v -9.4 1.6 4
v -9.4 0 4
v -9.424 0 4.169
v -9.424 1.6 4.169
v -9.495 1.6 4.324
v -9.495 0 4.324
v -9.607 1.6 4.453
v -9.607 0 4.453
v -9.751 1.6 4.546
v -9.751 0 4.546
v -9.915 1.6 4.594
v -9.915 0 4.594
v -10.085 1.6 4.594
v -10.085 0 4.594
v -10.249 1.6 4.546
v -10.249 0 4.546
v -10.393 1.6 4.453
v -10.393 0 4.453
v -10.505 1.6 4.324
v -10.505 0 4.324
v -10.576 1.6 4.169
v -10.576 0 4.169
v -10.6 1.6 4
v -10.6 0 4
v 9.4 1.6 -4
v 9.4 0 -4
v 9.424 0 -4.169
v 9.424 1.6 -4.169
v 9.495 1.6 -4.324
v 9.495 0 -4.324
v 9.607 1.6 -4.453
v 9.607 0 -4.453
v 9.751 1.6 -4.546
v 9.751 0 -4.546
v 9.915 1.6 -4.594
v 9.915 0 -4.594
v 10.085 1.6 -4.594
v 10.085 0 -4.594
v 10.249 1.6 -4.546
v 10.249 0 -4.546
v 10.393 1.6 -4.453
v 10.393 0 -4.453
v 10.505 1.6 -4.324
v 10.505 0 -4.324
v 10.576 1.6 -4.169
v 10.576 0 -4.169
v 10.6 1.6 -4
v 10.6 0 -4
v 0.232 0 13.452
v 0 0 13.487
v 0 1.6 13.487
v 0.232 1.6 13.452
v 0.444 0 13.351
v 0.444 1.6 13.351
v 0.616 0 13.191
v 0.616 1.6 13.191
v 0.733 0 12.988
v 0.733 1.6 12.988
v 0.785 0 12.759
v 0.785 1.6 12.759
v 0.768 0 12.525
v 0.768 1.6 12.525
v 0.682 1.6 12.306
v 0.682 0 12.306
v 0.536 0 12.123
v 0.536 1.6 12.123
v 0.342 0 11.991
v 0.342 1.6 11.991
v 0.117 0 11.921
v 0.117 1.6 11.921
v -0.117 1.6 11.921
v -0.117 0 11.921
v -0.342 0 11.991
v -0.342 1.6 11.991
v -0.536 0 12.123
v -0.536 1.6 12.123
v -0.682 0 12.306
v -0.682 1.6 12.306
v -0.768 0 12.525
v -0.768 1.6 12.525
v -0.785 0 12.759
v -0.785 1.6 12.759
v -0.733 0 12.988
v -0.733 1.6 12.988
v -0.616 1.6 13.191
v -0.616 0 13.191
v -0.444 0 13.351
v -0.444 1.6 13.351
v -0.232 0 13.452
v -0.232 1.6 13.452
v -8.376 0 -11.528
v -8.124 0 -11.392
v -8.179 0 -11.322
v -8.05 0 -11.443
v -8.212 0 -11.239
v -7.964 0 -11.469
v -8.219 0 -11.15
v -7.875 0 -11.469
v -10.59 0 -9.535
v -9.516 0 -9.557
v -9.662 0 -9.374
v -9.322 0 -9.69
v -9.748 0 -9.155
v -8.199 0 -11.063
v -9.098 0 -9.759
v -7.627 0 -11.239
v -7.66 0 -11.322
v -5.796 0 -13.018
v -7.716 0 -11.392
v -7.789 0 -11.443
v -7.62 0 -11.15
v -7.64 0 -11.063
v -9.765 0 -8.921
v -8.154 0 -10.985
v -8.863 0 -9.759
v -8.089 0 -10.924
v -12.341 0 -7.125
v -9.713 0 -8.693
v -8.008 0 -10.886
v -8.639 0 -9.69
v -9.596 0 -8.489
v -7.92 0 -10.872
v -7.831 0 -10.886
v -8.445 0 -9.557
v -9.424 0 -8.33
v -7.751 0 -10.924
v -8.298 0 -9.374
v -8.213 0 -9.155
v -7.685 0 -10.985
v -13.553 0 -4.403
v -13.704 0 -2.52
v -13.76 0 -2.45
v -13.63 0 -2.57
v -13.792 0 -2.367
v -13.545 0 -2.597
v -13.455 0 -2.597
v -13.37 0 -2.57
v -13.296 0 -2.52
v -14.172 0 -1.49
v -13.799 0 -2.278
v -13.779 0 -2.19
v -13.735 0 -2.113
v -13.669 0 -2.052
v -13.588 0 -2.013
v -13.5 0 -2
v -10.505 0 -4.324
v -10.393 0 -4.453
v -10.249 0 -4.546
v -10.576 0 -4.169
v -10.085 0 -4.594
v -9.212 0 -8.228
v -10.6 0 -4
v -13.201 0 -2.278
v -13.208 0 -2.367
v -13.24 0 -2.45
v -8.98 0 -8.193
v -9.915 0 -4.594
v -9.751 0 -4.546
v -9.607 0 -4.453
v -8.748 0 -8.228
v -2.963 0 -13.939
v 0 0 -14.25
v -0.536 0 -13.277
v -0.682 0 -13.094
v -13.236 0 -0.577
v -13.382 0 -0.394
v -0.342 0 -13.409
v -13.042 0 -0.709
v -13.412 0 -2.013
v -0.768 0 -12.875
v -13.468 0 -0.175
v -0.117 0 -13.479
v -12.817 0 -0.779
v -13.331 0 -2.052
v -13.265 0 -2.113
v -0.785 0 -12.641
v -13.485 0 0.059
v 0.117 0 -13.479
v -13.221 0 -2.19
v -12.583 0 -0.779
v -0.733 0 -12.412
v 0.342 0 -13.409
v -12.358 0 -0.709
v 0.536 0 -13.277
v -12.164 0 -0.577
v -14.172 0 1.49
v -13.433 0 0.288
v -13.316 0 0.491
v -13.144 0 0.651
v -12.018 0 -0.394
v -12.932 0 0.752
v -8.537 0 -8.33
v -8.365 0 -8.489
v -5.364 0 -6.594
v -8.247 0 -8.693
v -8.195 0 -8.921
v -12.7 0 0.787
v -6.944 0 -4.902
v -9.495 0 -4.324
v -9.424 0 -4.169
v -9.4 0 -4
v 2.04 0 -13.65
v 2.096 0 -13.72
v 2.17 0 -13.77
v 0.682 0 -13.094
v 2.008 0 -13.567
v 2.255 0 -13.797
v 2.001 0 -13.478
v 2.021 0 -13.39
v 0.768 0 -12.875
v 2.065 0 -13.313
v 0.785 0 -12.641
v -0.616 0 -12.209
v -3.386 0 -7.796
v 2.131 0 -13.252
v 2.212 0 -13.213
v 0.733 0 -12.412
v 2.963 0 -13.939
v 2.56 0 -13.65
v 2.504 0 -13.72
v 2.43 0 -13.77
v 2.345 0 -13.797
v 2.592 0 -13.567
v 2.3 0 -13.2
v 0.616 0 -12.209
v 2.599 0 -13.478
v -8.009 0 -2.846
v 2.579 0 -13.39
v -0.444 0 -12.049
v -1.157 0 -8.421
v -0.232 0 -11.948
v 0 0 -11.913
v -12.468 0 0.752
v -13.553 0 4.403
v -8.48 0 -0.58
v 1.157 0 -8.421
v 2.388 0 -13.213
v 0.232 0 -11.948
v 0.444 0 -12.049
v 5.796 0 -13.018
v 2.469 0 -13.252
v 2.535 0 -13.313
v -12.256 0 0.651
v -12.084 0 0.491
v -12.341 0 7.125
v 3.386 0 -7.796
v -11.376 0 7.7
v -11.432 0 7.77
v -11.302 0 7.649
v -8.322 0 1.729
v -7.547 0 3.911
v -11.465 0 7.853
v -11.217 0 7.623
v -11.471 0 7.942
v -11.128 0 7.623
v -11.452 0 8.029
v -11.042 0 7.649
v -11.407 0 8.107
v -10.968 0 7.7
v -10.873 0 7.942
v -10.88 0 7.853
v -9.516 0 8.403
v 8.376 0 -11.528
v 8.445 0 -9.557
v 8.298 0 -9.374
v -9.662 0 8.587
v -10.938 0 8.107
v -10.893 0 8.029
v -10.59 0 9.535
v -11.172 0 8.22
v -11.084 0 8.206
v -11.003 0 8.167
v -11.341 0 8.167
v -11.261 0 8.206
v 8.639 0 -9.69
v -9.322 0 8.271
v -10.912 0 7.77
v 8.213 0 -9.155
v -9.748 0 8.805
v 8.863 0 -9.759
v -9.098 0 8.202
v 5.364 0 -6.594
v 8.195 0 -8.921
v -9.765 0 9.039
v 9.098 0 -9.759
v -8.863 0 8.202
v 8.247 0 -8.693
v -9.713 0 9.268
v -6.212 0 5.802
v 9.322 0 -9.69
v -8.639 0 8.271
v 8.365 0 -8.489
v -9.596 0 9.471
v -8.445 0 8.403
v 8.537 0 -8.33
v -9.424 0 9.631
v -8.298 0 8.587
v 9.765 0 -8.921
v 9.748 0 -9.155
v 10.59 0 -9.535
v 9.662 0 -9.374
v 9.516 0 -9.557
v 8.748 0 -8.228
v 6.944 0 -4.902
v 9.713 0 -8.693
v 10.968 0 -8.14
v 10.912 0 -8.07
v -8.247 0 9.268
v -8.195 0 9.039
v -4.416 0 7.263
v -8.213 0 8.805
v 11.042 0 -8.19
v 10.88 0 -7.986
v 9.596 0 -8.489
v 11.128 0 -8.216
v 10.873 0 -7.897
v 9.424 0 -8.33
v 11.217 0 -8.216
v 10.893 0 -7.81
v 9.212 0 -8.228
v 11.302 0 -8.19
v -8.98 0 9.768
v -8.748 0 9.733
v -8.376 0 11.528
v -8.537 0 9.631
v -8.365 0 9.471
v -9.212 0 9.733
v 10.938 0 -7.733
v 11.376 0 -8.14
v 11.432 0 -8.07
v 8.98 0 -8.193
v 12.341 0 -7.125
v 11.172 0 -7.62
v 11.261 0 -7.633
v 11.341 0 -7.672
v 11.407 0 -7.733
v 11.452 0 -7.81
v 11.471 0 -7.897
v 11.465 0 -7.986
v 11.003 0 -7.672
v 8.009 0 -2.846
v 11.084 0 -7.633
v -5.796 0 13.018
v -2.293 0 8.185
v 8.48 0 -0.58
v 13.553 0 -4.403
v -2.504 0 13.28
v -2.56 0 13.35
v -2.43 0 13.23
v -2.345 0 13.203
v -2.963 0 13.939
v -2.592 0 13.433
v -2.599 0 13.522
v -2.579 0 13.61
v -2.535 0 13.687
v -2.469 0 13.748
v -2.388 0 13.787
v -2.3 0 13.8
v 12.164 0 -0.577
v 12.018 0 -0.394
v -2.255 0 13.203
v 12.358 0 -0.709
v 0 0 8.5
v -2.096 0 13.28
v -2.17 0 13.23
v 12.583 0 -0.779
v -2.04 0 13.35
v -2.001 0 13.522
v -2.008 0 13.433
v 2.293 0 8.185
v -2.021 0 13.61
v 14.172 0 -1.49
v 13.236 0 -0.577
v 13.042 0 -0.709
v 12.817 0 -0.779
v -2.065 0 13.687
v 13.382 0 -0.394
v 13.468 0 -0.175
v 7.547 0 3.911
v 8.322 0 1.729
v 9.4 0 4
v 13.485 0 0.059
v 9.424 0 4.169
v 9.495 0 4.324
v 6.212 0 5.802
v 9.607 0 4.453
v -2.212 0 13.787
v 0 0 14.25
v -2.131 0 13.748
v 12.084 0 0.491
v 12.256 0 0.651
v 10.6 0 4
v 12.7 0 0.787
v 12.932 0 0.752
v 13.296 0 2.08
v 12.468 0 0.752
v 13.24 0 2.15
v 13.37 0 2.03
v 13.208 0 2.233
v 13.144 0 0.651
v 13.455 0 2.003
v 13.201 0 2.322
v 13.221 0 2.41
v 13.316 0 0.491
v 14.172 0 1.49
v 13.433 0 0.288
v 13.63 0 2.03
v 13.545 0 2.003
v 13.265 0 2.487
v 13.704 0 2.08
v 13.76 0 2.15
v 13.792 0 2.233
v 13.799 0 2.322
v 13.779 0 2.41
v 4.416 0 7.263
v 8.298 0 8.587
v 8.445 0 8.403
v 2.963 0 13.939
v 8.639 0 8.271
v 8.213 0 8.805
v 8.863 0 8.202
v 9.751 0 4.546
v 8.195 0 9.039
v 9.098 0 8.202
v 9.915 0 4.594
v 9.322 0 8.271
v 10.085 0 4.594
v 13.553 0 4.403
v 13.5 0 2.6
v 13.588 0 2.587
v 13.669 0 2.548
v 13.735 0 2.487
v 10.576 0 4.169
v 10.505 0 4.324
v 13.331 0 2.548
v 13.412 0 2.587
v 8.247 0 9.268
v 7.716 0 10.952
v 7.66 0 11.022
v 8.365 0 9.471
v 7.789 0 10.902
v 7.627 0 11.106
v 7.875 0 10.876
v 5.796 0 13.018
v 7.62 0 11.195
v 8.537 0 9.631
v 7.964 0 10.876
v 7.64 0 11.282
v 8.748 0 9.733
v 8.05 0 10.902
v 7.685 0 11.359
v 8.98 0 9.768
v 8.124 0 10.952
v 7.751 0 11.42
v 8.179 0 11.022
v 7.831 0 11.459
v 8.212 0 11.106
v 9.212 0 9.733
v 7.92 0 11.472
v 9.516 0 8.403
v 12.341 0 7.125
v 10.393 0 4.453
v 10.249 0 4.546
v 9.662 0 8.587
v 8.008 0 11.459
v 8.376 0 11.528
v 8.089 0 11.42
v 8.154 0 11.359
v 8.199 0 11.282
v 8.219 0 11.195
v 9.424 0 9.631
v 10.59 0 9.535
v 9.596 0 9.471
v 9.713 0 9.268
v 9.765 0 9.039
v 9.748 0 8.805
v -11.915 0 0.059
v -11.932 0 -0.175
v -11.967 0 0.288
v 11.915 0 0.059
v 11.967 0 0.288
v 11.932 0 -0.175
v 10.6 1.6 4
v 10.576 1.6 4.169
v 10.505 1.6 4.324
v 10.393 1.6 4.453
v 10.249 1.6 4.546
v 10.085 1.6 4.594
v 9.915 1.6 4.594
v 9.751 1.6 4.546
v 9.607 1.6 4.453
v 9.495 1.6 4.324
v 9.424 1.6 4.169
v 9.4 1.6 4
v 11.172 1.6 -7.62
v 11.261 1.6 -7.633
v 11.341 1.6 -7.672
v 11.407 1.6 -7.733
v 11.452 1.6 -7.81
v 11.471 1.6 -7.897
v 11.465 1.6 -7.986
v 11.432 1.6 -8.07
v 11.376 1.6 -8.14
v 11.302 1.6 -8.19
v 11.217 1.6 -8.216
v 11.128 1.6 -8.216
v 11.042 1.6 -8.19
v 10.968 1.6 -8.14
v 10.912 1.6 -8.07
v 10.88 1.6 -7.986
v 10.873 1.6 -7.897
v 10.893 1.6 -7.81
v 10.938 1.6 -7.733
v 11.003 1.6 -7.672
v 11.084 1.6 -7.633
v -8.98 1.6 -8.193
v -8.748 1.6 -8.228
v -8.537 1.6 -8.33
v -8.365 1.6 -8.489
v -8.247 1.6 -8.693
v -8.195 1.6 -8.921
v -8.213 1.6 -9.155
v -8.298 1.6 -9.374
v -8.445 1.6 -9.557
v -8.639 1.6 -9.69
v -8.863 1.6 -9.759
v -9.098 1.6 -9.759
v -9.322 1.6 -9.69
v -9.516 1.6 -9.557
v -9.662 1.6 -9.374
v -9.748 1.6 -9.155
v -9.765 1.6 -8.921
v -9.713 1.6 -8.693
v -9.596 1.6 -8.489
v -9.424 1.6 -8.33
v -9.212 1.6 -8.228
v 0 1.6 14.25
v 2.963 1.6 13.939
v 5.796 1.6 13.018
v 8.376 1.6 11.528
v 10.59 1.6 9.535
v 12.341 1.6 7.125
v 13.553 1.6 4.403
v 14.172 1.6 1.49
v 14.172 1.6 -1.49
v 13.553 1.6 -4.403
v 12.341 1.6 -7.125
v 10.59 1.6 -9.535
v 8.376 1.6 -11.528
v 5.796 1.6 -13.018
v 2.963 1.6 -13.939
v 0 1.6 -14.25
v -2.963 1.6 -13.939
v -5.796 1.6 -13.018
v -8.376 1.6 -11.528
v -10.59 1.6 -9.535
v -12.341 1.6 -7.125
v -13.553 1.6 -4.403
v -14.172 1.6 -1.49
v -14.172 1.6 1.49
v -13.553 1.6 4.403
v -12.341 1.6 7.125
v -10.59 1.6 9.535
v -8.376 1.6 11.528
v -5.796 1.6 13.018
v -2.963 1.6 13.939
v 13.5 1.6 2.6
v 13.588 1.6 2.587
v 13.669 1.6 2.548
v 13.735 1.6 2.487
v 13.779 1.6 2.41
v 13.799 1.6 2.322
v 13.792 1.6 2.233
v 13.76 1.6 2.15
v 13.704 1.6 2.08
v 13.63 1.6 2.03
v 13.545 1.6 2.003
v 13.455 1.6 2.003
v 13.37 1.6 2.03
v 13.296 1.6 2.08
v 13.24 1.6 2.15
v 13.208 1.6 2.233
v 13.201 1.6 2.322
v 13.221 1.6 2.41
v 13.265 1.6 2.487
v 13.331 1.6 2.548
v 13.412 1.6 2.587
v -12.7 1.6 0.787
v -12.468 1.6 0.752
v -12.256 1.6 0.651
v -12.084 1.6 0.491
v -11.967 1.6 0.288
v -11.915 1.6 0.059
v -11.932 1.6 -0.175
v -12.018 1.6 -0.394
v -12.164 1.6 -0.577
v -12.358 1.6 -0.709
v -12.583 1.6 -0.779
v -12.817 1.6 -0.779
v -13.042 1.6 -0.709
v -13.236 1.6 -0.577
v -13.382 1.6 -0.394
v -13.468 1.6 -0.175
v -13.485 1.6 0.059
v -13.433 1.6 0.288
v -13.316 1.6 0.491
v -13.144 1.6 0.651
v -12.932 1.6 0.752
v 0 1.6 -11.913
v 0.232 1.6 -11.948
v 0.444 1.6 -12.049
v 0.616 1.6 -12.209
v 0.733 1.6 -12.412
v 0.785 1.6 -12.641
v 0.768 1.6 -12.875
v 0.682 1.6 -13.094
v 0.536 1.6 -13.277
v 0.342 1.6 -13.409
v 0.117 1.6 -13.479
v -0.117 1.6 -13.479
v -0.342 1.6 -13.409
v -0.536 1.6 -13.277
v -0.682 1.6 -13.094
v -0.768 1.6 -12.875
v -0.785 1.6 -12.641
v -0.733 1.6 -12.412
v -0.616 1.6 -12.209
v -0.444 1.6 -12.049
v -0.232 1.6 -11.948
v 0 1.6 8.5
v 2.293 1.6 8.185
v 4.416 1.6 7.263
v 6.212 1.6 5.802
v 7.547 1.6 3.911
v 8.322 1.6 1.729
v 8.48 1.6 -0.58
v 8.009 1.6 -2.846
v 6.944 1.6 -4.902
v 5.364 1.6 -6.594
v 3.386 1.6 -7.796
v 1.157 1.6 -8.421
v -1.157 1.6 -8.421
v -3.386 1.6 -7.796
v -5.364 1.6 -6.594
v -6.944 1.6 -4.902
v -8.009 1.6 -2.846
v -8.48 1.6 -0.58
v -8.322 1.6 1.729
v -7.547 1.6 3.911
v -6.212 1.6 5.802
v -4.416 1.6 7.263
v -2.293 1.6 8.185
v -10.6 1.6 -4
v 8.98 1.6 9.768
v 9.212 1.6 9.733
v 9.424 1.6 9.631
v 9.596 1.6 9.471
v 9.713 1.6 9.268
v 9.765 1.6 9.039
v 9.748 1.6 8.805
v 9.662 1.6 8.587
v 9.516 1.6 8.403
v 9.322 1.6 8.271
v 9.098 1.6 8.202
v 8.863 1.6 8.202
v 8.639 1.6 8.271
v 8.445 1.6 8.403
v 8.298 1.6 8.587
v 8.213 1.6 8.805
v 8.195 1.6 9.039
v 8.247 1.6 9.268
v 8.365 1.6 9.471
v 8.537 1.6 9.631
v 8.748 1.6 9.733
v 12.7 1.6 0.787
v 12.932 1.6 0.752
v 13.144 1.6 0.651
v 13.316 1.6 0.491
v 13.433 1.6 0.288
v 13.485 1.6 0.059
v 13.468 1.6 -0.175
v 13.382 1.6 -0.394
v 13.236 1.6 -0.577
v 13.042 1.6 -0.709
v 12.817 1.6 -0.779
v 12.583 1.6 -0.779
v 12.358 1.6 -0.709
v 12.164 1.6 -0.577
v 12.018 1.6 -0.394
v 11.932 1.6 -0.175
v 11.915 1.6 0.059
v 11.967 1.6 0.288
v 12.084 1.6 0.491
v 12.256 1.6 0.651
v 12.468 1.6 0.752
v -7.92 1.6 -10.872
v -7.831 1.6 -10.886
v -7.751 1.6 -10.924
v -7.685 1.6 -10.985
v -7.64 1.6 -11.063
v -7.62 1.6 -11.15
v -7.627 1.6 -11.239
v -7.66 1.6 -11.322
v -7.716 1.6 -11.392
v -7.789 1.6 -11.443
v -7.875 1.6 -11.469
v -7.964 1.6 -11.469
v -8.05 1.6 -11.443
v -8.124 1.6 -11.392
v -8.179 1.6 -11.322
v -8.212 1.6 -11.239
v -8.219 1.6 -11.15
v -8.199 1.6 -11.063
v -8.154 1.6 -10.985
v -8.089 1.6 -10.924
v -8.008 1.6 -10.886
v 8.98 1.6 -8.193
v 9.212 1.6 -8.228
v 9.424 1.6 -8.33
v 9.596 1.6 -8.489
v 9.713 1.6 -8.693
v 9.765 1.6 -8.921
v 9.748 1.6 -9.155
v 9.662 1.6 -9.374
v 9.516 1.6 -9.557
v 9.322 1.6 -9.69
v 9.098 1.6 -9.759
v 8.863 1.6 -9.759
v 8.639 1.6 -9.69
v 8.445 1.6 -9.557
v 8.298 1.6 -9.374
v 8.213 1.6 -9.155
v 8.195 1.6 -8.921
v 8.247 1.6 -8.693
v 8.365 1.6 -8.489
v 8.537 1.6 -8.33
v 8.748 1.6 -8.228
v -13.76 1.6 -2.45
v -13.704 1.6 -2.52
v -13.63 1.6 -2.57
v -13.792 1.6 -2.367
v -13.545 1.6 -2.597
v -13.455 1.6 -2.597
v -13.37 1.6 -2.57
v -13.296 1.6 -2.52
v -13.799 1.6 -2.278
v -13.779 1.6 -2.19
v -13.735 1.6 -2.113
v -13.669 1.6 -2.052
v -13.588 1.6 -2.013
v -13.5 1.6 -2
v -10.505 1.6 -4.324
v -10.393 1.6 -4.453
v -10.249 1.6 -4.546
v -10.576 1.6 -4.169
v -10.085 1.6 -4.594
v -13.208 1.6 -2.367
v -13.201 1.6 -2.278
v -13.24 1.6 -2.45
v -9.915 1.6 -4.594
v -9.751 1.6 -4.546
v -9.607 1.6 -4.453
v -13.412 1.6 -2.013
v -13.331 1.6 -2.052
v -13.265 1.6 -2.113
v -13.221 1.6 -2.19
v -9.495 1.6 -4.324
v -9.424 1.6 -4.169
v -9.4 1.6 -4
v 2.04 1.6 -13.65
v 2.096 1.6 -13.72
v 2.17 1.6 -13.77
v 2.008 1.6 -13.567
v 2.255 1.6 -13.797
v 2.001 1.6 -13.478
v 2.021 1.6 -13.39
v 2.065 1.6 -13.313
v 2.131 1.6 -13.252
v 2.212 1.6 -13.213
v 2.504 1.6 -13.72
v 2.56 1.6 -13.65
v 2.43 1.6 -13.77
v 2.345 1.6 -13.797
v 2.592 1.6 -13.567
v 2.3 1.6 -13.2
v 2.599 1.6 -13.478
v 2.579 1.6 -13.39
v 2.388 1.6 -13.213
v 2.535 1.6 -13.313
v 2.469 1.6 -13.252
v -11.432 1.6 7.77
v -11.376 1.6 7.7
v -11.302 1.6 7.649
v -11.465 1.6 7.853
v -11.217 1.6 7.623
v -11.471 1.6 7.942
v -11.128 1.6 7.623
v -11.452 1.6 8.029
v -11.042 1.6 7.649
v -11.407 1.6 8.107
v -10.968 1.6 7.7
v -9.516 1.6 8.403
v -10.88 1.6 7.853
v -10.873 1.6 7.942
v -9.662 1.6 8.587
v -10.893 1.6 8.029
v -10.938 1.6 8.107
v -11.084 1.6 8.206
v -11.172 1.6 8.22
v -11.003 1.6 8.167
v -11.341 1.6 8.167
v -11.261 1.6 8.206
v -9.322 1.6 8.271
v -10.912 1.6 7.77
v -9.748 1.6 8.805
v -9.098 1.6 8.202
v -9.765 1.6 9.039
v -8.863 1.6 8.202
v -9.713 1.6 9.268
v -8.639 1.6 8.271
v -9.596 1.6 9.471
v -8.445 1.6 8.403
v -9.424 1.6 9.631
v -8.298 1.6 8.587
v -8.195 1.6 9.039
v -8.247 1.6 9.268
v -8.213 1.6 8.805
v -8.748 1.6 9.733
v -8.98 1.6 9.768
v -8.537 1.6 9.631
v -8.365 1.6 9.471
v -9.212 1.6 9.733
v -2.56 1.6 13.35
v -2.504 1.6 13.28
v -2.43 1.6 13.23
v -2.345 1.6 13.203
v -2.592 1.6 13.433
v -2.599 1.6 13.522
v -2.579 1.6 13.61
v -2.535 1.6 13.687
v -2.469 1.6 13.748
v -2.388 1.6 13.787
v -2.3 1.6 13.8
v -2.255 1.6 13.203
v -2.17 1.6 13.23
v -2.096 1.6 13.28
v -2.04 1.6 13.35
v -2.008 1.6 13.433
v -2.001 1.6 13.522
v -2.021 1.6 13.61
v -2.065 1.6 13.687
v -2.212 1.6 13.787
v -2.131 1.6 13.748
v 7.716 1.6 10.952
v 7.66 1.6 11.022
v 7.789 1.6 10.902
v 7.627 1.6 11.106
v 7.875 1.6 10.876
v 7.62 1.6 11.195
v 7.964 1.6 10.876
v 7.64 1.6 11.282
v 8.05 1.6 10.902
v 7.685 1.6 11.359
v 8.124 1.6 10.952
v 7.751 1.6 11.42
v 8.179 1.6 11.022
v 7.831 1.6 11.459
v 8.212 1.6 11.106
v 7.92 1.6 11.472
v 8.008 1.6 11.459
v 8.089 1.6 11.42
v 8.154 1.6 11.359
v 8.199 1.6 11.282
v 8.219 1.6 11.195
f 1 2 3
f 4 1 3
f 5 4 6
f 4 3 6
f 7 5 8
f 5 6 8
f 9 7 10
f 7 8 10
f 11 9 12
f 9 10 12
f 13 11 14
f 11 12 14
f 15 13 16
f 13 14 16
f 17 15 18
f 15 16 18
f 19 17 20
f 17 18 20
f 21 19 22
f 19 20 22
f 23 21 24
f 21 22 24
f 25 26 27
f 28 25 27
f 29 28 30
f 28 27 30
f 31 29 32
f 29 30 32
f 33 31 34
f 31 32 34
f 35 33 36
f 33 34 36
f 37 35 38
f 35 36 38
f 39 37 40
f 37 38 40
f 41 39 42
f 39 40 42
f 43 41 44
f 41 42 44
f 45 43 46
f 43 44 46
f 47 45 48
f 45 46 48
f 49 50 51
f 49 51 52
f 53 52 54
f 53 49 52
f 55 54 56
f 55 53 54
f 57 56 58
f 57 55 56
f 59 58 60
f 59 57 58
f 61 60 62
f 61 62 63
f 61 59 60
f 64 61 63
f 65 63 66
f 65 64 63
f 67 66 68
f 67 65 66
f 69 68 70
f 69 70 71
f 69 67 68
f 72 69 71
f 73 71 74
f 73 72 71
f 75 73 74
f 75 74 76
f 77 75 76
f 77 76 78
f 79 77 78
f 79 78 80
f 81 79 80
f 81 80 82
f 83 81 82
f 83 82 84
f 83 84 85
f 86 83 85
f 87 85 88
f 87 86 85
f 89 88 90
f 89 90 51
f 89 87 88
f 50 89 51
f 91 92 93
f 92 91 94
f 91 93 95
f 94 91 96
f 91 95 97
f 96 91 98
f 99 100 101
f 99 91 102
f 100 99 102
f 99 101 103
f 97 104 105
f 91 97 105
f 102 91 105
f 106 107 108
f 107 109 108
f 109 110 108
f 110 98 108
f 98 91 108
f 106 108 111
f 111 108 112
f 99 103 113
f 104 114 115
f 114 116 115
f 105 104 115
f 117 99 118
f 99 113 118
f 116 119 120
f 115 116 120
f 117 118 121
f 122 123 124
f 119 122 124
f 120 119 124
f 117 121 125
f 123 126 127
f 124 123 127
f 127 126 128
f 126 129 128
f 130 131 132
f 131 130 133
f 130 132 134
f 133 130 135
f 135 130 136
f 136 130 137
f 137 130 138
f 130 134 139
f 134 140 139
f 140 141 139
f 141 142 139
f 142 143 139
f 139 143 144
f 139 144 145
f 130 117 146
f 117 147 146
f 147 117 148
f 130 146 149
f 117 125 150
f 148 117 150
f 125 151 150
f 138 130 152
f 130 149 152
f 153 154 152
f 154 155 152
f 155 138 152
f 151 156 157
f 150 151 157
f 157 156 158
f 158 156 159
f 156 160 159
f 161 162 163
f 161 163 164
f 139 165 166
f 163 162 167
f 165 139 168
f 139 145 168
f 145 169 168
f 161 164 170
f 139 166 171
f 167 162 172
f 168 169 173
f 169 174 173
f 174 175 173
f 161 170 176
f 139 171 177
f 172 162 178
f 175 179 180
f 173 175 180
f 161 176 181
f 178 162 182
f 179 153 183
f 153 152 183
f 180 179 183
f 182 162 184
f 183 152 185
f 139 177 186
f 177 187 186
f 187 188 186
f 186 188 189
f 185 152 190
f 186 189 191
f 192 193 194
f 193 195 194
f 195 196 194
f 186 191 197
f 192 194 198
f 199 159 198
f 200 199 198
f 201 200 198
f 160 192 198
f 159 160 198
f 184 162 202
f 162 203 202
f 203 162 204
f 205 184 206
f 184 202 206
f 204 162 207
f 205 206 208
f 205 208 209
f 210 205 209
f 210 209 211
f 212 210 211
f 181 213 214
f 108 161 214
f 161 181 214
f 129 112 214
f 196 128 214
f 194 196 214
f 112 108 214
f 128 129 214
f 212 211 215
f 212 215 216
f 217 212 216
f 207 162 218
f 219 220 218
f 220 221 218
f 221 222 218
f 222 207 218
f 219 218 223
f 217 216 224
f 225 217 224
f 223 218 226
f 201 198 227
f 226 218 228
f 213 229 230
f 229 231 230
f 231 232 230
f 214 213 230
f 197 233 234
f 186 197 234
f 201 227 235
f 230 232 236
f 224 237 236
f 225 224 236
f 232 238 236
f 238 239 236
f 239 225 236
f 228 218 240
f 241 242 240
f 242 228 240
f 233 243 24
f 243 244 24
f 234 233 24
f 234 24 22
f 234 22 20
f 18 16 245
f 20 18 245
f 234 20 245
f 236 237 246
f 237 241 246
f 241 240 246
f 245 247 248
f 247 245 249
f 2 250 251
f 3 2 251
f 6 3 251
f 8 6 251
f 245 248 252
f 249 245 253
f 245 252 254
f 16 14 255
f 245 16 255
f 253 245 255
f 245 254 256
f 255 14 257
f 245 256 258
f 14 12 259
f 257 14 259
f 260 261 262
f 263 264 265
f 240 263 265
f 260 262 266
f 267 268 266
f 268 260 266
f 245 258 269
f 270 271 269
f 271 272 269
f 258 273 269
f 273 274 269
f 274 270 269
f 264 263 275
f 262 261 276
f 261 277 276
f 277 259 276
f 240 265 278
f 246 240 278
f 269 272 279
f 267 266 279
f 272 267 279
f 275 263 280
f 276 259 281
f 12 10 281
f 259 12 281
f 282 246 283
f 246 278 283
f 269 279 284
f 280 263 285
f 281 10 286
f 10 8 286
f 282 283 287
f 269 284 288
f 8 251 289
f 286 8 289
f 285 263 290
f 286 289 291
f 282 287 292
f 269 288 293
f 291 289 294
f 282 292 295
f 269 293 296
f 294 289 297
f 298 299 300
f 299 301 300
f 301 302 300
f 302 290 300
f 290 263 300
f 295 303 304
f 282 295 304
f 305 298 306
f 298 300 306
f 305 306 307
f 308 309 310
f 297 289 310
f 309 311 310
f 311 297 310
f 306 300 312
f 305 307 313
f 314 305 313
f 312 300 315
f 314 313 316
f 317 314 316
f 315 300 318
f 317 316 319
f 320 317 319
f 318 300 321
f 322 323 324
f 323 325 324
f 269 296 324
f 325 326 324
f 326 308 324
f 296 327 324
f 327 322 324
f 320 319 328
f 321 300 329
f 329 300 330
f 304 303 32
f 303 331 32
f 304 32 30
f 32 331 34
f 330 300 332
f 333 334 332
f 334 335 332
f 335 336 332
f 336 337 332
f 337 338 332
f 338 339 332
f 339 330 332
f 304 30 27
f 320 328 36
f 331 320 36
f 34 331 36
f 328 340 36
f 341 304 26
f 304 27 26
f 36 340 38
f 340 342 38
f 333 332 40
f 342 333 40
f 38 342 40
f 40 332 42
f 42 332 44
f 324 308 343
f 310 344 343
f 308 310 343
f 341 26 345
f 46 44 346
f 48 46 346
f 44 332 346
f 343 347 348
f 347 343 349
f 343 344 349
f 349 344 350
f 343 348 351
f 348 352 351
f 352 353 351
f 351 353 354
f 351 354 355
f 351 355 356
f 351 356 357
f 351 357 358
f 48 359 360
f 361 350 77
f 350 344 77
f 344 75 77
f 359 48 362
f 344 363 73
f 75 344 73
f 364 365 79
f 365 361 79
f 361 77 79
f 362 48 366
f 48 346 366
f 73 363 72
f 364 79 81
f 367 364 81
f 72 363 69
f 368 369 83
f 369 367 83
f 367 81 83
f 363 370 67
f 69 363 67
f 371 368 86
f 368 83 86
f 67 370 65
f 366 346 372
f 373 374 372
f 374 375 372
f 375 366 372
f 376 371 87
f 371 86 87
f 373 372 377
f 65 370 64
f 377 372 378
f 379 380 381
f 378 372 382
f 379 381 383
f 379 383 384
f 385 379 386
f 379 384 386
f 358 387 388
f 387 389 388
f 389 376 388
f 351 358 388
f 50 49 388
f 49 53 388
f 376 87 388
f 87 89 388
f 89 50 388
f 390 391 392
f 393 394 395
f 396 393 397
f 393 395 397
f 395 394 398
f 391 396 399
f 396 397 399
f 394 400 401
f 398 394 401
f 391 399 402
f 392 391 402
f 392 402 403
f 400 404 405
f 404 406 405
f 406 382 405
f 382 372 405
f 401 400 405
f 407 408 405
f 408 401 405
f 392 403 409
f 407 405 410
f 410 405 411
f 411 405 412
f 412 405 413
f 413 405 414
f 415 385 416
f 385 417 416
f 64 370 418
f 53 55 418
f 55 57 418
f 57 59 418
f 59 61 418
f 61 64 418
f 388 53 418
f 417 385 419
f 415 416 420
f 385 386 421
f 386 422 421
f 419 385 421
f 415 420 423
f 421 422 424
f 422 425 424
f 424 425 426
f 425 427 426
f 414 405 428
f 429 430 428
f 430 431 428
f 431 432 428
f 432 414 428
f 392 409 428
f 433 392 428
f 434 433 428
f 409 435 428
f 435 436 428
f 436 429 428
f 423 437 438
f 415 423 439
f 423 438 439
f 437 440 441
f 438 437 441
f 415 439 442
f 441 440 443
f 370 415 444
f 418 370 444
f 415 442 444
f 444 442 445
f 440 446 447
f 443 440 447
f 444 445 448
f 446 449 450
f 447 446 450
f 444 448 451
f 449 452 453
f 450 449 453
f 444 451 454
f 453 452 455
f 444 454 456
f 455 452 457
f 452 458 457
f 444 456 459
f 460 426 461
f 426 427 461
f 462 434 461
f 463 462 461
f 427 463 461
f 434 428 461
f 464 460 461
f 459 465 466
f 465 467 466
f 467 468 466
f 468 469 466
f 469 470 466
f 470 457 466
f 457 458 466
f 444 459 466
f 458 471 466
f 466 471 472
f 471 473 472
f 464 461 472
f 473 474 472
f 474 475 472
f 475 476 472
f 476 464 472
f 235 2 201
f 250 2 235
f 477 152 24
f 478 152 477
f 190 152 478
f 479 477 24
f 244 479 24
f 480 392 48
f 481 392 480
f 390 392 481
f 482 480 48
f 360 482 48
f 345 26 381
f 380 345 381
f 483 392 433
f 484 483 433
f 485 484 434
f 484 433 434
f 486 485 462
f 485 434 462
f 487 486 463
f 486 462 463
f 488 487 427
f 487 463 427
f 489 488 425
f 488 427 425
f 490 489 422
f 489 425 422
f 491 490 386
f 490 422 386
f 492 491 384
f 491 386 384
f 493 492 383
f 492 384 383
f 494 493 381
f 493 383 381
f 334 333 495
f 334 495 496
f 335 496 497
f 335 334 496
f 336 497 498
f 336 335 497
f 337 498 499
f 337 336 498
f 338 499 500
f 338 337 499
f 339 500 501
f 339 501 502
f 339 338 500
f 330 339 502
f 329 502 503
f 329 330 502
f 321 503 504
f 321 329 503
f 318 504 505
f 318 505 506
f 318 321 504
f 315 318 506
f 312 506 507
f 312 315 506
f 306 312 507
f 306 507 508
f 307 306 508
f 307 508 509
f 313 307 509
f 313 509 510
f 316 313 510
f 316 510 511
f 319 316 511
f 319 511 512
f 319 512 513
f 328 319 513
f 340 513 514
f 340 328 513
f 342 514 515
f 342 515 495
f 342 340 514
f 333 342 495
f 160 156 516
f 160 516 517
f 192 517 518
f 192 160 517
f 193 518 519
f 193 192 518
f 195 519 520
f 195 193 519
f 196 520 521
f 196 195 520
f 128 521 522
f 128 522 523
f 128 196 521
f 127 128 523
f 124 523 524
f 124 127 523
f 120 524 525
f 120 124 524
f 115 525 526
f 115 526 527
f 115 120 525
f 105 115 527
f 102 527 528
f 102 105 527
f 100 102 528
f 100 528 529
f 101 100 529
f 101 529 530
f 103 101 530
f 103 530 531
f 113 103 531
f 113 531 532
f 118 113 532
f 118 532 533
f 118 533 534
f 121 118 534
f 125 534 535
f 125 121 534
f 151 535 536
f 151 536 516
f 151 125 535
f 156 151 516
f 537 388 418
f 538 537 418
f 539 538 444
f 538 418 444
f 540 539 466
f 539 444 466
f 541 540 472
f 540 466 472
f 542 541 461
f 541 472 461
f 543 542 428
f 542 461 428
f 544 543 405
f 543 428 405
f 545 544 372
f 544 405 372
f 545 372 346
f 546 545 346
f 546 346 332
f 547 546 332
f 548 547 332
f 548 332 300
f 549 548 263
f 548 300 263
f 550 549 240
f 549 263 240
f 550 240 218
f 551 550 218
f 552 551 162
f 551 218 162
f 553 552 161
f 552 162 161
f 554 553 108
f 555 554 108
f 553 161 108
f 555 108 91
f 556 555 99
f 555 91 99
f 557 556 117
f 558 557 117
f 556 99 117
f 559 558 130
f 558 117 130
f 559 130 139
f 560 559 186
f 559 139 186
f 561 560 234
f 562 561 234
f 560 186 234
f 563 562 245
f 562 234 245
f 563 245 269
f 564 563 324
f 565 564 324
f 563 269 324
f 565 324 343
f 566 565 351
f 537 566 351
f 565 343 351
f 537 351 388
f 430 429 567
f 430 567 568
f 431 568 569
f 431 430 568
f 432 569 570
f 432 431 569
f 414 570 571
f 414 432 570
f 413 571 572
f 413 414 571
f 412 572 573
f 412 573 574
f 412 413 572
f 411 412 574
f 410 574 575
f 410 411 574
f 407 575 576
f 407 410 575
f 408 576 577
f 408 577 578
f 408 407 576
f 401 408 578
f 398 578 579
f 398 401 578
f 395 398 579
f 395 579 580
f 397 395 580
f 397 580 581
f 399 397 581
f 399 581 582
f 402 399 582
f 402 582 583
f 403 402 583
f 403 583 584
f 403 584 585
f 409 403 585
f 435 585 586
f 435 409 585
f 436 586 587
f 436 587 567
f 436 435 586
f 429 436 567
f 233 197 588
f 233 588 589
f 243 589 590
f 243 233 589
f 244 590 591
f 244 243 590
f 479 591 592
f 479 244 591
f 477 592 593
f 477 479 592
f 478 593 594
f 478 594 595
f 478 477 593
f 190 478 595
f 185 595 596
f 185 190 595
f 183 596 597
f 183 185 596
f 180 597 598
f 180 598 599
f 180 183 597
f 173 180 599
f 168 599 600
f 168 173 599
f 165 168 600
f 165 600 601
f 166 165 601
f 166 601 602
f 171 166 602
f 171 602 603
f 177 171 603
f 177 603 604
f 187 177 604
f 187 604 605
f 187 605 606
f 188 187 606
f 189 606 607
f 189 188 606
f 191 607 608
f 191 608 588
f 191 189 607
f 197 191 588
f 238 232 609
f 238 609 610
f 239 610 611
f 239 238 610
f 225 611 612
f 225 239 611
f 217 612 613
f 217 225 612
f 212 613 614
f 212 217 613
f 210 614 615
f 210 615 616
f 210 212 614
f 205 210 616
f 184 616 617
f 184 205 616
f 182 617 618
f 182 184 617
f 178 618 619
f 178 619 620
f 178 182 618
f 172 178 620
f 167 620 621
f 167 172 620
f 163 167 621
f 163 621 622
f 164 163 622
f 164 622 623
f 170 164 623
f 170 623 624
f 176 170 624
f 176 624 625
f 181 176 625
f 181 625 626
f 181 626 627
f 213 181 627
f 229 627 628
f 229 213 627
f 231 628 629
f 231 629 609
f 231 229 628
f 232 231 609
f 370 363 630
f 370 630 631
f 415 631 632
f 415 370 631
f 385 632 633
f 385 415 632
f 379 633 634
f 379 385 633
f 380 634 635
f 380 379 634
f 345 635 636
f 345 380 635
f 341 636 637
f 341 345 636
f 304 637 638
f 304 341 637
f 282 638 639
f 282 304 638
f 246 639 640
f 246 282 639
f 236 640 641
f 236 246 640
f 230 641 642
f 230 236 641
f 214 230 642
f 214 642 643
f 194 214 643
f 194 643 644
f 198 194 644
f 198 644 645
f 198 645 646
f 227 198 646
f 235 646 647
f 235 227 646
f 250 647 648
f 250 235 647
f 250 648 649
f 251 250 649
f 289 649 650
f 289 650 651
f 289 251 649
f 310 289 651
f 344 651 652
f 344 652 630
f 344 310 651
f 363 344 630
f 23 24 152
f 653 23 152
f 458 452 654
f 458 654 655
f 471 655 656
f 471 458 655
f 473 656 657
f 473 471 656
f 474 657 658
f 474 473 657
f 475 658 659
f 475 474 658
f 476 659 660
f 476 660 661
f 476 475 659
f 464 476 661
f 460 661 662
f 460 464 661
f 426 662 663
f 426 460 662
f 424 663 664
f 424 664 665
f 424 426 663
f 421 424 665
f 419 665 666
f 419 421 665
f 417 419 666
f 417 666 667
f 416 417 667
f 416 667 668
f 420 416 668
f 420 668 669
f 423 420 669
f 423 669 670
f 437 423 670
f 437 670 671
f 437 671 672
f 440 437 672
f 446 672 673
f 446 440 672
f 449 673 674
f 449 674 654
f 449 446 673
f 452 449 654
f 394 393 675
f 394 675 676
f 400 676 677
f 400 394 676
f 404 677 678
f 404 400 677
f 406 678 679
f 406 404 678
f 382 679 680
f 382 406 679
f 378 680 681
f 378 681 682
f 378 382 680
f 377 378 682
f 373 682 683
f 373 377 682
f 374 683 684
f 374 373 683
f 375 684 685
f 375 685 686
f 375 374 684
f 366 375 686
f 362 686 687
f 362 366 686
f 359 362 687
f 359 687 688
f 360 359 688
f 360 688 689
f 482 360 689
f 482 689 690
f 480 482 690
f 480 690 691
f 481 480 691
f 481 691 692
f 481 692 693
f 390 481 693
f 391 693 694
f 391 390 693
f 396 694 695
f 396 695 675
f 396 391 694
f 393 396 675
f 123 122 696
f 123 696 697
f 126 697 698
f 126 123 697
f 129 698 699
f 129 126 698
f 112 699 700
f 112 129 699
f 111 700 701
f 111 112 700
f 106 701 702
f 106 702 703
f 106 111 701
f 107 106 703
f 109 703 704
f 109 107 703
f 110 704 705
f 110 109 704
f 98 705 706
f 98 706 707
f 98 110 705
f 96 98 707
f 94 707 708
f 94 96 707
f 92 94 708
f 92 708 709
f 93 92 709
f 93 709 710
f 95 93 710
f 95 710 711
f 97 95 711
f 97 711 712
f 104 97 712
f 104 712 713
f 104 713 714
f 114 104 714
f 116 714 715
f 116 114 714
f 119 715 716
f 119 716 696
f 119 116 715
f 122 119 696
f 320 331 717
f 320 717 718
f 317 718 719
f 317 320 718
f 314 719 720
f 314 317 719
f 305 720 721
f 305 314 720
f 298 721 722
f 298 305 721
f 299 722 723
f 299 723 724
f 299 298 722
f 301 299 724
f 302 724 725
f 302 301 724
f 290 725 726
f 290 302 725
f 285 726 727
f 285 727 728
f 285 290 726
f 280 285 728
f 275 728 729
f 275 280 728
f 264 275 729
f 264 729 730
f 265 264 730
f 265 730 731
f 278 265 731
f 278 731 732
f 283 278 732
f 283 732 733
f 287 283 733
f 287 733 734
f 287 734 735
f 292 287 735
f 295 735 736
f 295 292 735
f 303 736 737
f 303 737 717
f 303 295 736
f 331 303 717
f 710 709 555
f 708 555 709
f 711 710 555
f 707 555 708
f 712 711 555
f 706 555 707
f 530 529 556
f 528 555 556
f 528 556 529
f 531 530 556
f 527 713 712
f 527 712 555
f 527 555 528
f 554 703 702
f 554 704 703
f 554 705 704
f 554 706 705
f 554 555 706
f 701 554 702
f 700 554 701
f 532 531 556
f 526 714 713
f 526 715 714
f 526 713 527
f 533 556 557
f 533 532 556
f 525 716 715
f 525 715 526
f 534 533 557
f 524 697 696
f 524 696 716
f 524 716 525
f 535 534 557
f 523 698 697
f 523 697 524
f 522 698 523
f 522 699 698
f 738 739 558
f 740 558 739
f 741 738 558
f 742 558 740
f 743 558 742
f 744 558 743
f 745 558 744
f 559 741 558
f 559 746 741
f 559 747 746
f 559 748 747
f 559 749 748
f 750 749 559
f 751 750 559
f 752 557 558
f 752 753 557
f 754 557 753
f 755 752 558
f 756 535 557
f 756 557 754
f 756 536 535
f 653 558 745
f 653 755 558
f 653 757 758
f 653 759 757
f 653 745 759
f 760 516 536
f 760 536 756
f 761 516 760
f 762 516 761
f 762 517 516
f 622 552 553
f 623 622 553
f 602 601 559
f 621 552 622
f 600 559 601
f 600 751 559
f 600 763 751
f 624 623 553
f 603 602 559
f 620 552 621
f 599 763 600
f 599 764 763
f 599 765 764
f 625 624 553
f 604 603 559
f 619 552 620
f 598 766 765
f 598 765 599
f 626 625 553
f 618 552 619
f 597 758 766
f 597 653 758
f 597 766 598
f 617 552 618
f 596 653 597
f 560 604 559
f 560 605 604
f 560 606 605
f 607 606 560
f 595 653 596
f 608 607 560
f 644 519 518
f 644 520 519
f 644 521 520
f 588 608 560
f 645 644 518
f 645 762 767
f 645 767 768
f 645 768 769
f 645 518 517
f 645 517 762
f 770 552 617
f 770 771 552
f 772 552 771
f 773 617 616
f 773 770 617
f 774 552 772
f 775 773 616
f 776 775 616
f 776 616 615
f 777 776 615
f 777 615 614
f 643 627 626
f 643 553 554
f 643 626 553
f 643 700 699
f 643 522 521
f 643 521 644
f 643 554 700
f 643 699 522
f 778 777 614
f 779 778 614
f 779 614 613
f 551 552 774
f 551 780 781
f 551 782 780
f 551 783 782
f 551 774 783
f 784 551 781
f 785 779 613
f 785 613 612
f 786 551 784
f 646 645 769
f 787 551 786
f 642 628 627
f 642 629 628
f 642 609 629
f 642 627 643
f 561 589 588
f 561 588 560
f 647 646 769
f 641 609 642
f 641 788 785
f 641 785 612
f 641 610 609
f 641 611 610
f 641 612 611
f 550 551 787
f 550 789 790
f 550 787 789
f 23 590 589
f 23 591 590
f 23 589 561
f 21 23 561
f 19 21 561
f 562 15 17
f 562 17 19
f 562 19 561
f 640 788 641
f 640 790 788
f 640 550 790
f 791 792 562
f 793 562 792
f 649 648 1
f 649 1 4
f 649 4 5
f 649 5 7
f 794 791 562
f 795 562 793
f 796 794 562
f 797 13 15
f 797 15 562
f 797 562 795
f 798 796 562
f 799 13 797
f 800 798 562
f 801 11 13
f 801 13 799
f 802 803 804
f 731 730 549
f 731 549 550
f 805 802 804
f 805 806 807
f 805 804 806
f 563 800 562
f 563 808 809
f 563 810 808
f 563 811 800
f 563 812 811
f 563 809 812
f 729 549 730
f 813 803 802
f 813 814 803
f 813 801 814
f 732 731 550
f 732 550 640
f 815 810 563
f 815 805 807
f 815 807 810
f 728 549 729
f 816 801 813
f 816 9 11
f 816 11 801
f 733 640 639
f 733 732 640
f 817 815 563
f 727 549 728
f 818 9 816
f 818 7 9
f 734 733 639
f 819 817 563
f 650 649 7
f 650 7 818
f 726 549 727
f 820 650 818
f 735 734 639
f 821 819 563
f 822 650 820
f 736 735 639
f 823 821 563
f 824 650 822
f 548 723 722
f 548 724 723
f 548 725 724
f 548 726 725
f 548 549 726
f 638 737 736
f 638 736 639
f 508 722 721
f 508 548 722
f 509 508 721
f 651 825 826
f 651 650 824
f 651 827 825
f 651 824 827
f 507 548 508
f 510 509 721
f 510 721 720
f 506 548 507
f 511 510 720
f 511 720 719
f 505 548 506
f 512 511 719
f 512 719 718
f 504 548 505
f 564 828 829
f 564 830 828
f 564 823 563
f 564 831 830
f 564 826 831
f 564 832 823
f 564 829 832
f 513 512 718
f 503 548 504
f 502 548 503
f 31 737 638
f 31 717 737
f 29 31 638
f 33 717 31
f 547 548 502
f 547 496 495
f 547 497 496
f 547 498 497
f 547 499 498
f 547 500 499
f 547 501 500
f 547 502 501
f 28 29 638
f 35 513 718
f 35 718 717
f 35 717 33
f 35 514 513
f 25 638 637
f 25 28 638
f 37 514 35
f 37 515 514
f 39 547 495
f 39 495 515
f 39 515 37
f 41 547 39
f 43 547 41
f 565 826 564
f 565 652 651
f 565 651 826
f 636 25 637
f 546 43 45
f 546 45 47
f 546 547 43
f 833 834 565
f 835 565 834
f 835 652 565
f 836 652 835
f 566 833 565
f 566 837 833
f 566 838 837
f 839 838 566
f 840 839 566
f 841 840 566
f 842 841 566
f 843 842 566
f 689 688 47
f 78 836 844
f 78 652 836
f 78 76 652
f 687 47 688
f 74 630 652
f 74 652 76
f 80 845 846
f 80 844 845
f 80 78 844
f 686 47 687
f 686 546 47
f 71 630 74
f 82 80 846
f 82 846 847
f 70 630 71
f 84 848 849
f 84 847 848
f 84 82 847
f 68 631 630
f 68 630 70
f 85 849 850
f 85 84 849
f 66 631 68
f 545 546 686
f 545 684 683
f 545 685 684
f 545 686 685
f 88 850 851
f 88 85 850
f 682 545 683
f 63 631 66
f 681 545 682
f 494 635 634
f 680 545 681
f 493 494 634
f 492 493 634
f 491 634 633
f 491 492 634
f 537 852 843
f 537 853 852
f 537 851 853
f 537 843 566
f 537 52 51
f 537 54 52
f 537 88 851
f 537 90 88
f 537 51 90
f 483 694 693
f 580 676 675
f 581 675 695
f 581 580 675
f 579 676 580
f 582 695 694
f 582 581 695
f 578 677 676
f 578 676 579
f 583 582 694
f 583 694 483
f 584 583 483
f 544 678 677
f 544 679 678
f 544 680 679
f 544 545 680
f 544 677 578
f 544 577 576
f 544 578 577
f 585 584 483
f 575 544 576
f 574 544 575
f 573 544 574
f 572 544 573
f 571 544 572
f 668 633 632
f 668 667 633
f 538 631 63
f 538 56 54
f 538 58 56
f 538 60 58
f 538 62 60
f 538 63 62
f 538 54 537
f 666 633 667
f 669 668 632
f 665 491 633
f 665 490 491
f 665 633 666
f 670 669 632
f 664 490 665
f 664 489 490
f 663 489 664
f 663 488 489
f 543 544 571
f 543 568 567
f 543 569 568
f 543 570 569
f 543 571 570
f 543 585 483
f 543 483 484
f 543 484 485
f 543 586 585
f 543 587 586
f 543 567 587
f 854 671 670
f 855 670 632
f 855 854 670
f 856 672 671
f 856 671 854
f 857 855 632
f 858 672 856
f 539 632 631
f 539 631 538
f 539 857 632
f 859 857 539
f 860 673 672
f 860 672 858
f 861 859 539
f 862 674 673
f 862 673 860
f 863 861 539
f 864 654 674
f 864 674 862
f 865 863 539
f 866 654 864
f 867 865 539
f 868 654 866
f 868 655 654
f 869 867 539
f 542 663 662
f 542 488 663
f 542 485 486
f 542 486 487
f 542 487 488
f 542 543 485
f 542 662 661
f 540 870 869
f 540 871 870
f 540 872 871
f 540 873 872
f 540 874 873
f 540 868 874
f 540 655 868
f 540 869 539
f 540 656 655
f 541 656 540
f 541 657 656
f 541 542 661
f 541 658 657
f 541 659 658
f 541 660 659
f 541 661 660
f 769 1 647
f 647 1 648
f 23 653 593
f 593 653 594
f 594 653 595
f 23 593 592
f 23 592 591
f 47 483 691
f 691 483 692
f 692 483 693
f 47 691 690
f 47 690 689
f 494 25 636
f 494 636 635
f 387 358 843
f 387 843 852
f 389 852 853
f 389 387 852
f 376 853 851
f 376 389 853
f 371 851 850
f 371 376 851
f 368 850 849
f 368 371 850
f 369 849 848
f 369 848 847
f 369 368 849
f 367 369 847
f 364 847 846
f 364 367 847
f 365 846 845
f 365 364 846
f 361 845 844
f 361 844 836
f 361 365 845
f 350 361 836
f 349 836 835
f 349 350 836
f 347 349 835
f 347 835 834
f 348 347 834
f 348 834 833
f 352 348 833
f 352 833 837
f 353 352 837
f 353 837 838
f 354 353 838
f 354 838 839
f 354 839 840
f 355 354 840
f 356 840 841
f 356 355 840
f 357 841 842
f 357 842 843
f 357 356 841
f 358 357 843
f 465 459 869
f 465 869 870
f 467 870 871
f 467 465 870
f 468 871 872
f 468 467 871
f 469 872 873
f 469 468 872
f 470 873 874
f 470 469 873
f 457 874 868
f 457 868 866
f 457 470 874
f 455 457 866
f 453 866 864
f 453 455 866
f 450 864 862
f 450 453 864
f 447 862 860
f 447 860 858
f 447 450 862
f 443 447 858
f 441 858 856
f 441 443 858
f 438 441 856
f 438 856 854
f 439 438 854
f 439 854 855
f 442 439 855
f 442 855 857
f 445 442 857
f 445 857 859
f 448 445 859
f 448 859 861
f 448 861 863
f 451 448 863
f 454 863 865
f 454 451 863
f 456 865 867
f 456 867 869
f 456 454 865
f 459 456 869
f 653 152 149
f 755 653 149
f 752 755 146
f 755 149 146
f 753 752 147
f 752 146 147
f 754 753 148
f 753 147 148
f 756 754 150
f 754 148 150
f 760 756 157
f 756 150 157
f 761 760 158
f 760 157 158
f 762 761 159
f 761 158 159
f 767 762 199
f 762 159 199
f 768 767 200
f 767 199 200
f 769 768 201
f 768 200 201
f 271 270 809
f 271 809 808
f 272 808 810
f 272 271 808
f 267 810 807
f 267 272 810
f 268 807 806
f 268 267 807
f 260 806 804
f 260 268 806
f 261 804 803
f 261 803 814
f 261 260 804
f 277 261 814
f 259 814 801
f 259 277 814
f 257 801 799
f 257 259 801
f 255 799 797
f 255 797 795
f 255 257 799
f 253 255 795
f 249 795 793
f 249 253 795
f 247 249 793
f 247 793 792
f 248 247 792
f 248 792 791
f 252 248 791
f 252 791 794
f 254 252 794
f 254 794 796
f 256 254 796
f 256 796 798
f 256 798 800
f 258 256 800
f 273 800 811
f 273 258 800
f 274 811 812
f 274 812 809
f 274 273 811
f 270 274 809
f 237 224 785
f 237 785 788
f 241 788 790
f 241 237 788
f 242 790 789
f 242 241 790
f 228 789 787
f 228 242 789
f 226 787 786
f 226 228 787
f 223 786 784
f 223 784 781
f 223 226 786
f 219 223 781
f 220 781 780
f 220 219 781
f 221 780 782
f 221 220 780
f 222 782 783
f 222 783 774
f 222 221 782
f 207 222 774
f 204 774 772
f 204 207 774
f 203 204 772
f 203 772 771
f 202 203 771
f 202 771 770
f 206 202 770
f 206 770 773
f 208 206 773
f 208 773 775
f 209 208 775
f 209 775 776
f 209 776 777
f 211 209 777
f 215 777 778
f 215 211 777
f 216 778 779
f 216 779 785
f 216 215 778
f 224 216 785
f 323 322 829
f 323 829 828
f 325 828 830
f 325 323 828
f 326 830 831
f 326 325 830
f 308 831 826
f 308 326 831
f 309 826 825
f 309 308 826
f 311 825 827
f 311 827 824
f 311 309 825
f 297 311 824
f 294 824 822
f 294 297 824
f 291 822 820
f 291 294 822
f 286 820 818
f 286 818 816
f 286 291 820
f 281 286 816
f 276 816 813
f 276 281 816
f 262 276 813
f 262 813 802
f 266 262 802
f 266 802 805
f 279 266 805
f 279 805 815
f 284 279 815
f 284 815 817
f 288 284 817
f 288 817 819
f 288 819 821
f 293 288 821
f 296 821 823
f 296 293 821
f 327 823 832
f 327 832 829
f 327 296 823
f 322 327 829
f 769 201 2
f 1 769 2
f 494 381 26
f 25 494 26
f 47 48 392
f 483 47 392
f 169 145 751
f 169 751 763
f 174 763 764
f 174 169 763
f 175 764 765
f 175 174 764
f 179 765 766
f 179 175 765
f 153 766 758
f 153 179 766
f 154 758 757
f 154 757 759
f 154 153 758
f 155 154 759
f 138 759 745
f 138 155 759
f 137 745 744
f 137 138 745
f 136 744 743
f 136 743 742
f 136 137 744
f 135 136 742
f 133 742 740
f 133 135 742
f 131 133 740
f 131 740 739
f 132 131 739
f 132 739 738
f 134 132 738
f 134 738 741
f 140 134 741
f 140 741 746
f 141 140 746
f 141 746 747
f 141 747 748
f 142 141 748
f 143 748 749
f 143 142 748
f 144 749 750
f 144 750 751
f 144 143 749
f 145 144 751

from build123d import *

# Parameters (mm, degrees)
SKETCH1_R           = 14.25
SKETCH1_R_2         = 0.3
SKETCH1_R_3         = 0.7874
SKETCH1_R_4         = 8.5
BOSS_EXTRUDE1_DEPTH = 1.6


with BuildPart() as part:
    # Sketch1 → Boss-Extrude1 (new body)
    with BuildSketch(Plane(origin=(0, 0, 0), x_dir=(1, 0, 0), z_dir=(0, 1, 0))):
        Circle(SKETCH1_R)
        with Locations((-11.172287143, -7.919595949)):
            Circle(SKETCH1_R_2, mode=Mode.SUBTRACT)
        with Locations((-8.980256121, -8.980256121)):
            Circle(SKETCH1_R_3, mode=Mode.SUBTRACT)
        with Locations((-2.3, -13.5)):
            Circle(SKETCH1_R_2, mode=Mode.SUBTRACT)
        with Locations((0, -12.7)):
            Circle(SKETCH1_R_3, mode=Mode.SUBTRACT)
        with Locations((7.919595949, -11.172287143)):
            Circle(SKETCH1_R_2, mode=Mode.SUBTRACT)
        with Locations((8.980256121, -8.980256121)):
            Circle(SKETCH1_R_3, mode=Mode.SUBTRACT)
        with Locations((13.5, -2.3)):
            Circle(SKETCH1_R_2, mode=Mode.SUBTRACT)
        with Locations((12.7, 0)):
            Circle(SKETCH1_R_3, mode=Mode.SUBTRACT)
        with Locations((-12.7, 0)):
            Circle(SKETCH1_R_3, mode=Mode.SUBTRACT)
        with Locations((-13.5, 2.3)):
            Circle(SKETCH1_R_2, mode=Mode.SUBTRACT)
        with BuildLine():
            Line((-9.4, 4), (-9.4, -4))
            ThreePointArc((-9.4, -4), (-10, -4.6), (-10.6, -4))
            Line((-10.6, -4), (-10.6, 4))
            ThreePointArc((-10.6, 4), (-10, 4.6), (-9.4, 4))
        make_face(mode=Mode.SUBTRACT)
        with Locations((-8.980256121, 8.980256121)):
            Circle(SKETCH1_R_3, mode=Mode.SUBTRACT)
        with Locations((-7.919595949, 11.172287143)):
            Circle(SKETCH1_R_2, mode=Mode.SUBTRACT)
        Circle(SKETCH1_R_4, mode=Mode.SUBTRACT)
        with BuildLine():
            ThreePointArc((10.6, -4), (10, -4.6), (9.4, -4))
            Line((9.4, -4), (9.4, 4))
            ThreePointArc((9.4, 4), (10, 4.6), (10.6, 4))
            Line((10.6, 4), (10.6, -4))
        make_face(mode=Mode.SUBTRACT)
        with Locations((0, 12.7)):
            Circle(SKETCH1_R_3, mode=Mode.SUBTRACT)
        with Locations((2.3, 13.5)):
            Circle(SKETCH1_R_2, mode=Mode.SUBTRACT)
        with Locations((8.980256121, 8.980256121)):
            Circle(SKETCH1_R_3, mode=Mode.SUBTRACT)
        with Locations((11.172287143, 7.919595949)):
            Circle(SKETCH1_R_2, mode=Mode.SUBTRACT)
    extrude(amount=BOSS_EXTRUDE1_DEPTH)


solid = part.part
